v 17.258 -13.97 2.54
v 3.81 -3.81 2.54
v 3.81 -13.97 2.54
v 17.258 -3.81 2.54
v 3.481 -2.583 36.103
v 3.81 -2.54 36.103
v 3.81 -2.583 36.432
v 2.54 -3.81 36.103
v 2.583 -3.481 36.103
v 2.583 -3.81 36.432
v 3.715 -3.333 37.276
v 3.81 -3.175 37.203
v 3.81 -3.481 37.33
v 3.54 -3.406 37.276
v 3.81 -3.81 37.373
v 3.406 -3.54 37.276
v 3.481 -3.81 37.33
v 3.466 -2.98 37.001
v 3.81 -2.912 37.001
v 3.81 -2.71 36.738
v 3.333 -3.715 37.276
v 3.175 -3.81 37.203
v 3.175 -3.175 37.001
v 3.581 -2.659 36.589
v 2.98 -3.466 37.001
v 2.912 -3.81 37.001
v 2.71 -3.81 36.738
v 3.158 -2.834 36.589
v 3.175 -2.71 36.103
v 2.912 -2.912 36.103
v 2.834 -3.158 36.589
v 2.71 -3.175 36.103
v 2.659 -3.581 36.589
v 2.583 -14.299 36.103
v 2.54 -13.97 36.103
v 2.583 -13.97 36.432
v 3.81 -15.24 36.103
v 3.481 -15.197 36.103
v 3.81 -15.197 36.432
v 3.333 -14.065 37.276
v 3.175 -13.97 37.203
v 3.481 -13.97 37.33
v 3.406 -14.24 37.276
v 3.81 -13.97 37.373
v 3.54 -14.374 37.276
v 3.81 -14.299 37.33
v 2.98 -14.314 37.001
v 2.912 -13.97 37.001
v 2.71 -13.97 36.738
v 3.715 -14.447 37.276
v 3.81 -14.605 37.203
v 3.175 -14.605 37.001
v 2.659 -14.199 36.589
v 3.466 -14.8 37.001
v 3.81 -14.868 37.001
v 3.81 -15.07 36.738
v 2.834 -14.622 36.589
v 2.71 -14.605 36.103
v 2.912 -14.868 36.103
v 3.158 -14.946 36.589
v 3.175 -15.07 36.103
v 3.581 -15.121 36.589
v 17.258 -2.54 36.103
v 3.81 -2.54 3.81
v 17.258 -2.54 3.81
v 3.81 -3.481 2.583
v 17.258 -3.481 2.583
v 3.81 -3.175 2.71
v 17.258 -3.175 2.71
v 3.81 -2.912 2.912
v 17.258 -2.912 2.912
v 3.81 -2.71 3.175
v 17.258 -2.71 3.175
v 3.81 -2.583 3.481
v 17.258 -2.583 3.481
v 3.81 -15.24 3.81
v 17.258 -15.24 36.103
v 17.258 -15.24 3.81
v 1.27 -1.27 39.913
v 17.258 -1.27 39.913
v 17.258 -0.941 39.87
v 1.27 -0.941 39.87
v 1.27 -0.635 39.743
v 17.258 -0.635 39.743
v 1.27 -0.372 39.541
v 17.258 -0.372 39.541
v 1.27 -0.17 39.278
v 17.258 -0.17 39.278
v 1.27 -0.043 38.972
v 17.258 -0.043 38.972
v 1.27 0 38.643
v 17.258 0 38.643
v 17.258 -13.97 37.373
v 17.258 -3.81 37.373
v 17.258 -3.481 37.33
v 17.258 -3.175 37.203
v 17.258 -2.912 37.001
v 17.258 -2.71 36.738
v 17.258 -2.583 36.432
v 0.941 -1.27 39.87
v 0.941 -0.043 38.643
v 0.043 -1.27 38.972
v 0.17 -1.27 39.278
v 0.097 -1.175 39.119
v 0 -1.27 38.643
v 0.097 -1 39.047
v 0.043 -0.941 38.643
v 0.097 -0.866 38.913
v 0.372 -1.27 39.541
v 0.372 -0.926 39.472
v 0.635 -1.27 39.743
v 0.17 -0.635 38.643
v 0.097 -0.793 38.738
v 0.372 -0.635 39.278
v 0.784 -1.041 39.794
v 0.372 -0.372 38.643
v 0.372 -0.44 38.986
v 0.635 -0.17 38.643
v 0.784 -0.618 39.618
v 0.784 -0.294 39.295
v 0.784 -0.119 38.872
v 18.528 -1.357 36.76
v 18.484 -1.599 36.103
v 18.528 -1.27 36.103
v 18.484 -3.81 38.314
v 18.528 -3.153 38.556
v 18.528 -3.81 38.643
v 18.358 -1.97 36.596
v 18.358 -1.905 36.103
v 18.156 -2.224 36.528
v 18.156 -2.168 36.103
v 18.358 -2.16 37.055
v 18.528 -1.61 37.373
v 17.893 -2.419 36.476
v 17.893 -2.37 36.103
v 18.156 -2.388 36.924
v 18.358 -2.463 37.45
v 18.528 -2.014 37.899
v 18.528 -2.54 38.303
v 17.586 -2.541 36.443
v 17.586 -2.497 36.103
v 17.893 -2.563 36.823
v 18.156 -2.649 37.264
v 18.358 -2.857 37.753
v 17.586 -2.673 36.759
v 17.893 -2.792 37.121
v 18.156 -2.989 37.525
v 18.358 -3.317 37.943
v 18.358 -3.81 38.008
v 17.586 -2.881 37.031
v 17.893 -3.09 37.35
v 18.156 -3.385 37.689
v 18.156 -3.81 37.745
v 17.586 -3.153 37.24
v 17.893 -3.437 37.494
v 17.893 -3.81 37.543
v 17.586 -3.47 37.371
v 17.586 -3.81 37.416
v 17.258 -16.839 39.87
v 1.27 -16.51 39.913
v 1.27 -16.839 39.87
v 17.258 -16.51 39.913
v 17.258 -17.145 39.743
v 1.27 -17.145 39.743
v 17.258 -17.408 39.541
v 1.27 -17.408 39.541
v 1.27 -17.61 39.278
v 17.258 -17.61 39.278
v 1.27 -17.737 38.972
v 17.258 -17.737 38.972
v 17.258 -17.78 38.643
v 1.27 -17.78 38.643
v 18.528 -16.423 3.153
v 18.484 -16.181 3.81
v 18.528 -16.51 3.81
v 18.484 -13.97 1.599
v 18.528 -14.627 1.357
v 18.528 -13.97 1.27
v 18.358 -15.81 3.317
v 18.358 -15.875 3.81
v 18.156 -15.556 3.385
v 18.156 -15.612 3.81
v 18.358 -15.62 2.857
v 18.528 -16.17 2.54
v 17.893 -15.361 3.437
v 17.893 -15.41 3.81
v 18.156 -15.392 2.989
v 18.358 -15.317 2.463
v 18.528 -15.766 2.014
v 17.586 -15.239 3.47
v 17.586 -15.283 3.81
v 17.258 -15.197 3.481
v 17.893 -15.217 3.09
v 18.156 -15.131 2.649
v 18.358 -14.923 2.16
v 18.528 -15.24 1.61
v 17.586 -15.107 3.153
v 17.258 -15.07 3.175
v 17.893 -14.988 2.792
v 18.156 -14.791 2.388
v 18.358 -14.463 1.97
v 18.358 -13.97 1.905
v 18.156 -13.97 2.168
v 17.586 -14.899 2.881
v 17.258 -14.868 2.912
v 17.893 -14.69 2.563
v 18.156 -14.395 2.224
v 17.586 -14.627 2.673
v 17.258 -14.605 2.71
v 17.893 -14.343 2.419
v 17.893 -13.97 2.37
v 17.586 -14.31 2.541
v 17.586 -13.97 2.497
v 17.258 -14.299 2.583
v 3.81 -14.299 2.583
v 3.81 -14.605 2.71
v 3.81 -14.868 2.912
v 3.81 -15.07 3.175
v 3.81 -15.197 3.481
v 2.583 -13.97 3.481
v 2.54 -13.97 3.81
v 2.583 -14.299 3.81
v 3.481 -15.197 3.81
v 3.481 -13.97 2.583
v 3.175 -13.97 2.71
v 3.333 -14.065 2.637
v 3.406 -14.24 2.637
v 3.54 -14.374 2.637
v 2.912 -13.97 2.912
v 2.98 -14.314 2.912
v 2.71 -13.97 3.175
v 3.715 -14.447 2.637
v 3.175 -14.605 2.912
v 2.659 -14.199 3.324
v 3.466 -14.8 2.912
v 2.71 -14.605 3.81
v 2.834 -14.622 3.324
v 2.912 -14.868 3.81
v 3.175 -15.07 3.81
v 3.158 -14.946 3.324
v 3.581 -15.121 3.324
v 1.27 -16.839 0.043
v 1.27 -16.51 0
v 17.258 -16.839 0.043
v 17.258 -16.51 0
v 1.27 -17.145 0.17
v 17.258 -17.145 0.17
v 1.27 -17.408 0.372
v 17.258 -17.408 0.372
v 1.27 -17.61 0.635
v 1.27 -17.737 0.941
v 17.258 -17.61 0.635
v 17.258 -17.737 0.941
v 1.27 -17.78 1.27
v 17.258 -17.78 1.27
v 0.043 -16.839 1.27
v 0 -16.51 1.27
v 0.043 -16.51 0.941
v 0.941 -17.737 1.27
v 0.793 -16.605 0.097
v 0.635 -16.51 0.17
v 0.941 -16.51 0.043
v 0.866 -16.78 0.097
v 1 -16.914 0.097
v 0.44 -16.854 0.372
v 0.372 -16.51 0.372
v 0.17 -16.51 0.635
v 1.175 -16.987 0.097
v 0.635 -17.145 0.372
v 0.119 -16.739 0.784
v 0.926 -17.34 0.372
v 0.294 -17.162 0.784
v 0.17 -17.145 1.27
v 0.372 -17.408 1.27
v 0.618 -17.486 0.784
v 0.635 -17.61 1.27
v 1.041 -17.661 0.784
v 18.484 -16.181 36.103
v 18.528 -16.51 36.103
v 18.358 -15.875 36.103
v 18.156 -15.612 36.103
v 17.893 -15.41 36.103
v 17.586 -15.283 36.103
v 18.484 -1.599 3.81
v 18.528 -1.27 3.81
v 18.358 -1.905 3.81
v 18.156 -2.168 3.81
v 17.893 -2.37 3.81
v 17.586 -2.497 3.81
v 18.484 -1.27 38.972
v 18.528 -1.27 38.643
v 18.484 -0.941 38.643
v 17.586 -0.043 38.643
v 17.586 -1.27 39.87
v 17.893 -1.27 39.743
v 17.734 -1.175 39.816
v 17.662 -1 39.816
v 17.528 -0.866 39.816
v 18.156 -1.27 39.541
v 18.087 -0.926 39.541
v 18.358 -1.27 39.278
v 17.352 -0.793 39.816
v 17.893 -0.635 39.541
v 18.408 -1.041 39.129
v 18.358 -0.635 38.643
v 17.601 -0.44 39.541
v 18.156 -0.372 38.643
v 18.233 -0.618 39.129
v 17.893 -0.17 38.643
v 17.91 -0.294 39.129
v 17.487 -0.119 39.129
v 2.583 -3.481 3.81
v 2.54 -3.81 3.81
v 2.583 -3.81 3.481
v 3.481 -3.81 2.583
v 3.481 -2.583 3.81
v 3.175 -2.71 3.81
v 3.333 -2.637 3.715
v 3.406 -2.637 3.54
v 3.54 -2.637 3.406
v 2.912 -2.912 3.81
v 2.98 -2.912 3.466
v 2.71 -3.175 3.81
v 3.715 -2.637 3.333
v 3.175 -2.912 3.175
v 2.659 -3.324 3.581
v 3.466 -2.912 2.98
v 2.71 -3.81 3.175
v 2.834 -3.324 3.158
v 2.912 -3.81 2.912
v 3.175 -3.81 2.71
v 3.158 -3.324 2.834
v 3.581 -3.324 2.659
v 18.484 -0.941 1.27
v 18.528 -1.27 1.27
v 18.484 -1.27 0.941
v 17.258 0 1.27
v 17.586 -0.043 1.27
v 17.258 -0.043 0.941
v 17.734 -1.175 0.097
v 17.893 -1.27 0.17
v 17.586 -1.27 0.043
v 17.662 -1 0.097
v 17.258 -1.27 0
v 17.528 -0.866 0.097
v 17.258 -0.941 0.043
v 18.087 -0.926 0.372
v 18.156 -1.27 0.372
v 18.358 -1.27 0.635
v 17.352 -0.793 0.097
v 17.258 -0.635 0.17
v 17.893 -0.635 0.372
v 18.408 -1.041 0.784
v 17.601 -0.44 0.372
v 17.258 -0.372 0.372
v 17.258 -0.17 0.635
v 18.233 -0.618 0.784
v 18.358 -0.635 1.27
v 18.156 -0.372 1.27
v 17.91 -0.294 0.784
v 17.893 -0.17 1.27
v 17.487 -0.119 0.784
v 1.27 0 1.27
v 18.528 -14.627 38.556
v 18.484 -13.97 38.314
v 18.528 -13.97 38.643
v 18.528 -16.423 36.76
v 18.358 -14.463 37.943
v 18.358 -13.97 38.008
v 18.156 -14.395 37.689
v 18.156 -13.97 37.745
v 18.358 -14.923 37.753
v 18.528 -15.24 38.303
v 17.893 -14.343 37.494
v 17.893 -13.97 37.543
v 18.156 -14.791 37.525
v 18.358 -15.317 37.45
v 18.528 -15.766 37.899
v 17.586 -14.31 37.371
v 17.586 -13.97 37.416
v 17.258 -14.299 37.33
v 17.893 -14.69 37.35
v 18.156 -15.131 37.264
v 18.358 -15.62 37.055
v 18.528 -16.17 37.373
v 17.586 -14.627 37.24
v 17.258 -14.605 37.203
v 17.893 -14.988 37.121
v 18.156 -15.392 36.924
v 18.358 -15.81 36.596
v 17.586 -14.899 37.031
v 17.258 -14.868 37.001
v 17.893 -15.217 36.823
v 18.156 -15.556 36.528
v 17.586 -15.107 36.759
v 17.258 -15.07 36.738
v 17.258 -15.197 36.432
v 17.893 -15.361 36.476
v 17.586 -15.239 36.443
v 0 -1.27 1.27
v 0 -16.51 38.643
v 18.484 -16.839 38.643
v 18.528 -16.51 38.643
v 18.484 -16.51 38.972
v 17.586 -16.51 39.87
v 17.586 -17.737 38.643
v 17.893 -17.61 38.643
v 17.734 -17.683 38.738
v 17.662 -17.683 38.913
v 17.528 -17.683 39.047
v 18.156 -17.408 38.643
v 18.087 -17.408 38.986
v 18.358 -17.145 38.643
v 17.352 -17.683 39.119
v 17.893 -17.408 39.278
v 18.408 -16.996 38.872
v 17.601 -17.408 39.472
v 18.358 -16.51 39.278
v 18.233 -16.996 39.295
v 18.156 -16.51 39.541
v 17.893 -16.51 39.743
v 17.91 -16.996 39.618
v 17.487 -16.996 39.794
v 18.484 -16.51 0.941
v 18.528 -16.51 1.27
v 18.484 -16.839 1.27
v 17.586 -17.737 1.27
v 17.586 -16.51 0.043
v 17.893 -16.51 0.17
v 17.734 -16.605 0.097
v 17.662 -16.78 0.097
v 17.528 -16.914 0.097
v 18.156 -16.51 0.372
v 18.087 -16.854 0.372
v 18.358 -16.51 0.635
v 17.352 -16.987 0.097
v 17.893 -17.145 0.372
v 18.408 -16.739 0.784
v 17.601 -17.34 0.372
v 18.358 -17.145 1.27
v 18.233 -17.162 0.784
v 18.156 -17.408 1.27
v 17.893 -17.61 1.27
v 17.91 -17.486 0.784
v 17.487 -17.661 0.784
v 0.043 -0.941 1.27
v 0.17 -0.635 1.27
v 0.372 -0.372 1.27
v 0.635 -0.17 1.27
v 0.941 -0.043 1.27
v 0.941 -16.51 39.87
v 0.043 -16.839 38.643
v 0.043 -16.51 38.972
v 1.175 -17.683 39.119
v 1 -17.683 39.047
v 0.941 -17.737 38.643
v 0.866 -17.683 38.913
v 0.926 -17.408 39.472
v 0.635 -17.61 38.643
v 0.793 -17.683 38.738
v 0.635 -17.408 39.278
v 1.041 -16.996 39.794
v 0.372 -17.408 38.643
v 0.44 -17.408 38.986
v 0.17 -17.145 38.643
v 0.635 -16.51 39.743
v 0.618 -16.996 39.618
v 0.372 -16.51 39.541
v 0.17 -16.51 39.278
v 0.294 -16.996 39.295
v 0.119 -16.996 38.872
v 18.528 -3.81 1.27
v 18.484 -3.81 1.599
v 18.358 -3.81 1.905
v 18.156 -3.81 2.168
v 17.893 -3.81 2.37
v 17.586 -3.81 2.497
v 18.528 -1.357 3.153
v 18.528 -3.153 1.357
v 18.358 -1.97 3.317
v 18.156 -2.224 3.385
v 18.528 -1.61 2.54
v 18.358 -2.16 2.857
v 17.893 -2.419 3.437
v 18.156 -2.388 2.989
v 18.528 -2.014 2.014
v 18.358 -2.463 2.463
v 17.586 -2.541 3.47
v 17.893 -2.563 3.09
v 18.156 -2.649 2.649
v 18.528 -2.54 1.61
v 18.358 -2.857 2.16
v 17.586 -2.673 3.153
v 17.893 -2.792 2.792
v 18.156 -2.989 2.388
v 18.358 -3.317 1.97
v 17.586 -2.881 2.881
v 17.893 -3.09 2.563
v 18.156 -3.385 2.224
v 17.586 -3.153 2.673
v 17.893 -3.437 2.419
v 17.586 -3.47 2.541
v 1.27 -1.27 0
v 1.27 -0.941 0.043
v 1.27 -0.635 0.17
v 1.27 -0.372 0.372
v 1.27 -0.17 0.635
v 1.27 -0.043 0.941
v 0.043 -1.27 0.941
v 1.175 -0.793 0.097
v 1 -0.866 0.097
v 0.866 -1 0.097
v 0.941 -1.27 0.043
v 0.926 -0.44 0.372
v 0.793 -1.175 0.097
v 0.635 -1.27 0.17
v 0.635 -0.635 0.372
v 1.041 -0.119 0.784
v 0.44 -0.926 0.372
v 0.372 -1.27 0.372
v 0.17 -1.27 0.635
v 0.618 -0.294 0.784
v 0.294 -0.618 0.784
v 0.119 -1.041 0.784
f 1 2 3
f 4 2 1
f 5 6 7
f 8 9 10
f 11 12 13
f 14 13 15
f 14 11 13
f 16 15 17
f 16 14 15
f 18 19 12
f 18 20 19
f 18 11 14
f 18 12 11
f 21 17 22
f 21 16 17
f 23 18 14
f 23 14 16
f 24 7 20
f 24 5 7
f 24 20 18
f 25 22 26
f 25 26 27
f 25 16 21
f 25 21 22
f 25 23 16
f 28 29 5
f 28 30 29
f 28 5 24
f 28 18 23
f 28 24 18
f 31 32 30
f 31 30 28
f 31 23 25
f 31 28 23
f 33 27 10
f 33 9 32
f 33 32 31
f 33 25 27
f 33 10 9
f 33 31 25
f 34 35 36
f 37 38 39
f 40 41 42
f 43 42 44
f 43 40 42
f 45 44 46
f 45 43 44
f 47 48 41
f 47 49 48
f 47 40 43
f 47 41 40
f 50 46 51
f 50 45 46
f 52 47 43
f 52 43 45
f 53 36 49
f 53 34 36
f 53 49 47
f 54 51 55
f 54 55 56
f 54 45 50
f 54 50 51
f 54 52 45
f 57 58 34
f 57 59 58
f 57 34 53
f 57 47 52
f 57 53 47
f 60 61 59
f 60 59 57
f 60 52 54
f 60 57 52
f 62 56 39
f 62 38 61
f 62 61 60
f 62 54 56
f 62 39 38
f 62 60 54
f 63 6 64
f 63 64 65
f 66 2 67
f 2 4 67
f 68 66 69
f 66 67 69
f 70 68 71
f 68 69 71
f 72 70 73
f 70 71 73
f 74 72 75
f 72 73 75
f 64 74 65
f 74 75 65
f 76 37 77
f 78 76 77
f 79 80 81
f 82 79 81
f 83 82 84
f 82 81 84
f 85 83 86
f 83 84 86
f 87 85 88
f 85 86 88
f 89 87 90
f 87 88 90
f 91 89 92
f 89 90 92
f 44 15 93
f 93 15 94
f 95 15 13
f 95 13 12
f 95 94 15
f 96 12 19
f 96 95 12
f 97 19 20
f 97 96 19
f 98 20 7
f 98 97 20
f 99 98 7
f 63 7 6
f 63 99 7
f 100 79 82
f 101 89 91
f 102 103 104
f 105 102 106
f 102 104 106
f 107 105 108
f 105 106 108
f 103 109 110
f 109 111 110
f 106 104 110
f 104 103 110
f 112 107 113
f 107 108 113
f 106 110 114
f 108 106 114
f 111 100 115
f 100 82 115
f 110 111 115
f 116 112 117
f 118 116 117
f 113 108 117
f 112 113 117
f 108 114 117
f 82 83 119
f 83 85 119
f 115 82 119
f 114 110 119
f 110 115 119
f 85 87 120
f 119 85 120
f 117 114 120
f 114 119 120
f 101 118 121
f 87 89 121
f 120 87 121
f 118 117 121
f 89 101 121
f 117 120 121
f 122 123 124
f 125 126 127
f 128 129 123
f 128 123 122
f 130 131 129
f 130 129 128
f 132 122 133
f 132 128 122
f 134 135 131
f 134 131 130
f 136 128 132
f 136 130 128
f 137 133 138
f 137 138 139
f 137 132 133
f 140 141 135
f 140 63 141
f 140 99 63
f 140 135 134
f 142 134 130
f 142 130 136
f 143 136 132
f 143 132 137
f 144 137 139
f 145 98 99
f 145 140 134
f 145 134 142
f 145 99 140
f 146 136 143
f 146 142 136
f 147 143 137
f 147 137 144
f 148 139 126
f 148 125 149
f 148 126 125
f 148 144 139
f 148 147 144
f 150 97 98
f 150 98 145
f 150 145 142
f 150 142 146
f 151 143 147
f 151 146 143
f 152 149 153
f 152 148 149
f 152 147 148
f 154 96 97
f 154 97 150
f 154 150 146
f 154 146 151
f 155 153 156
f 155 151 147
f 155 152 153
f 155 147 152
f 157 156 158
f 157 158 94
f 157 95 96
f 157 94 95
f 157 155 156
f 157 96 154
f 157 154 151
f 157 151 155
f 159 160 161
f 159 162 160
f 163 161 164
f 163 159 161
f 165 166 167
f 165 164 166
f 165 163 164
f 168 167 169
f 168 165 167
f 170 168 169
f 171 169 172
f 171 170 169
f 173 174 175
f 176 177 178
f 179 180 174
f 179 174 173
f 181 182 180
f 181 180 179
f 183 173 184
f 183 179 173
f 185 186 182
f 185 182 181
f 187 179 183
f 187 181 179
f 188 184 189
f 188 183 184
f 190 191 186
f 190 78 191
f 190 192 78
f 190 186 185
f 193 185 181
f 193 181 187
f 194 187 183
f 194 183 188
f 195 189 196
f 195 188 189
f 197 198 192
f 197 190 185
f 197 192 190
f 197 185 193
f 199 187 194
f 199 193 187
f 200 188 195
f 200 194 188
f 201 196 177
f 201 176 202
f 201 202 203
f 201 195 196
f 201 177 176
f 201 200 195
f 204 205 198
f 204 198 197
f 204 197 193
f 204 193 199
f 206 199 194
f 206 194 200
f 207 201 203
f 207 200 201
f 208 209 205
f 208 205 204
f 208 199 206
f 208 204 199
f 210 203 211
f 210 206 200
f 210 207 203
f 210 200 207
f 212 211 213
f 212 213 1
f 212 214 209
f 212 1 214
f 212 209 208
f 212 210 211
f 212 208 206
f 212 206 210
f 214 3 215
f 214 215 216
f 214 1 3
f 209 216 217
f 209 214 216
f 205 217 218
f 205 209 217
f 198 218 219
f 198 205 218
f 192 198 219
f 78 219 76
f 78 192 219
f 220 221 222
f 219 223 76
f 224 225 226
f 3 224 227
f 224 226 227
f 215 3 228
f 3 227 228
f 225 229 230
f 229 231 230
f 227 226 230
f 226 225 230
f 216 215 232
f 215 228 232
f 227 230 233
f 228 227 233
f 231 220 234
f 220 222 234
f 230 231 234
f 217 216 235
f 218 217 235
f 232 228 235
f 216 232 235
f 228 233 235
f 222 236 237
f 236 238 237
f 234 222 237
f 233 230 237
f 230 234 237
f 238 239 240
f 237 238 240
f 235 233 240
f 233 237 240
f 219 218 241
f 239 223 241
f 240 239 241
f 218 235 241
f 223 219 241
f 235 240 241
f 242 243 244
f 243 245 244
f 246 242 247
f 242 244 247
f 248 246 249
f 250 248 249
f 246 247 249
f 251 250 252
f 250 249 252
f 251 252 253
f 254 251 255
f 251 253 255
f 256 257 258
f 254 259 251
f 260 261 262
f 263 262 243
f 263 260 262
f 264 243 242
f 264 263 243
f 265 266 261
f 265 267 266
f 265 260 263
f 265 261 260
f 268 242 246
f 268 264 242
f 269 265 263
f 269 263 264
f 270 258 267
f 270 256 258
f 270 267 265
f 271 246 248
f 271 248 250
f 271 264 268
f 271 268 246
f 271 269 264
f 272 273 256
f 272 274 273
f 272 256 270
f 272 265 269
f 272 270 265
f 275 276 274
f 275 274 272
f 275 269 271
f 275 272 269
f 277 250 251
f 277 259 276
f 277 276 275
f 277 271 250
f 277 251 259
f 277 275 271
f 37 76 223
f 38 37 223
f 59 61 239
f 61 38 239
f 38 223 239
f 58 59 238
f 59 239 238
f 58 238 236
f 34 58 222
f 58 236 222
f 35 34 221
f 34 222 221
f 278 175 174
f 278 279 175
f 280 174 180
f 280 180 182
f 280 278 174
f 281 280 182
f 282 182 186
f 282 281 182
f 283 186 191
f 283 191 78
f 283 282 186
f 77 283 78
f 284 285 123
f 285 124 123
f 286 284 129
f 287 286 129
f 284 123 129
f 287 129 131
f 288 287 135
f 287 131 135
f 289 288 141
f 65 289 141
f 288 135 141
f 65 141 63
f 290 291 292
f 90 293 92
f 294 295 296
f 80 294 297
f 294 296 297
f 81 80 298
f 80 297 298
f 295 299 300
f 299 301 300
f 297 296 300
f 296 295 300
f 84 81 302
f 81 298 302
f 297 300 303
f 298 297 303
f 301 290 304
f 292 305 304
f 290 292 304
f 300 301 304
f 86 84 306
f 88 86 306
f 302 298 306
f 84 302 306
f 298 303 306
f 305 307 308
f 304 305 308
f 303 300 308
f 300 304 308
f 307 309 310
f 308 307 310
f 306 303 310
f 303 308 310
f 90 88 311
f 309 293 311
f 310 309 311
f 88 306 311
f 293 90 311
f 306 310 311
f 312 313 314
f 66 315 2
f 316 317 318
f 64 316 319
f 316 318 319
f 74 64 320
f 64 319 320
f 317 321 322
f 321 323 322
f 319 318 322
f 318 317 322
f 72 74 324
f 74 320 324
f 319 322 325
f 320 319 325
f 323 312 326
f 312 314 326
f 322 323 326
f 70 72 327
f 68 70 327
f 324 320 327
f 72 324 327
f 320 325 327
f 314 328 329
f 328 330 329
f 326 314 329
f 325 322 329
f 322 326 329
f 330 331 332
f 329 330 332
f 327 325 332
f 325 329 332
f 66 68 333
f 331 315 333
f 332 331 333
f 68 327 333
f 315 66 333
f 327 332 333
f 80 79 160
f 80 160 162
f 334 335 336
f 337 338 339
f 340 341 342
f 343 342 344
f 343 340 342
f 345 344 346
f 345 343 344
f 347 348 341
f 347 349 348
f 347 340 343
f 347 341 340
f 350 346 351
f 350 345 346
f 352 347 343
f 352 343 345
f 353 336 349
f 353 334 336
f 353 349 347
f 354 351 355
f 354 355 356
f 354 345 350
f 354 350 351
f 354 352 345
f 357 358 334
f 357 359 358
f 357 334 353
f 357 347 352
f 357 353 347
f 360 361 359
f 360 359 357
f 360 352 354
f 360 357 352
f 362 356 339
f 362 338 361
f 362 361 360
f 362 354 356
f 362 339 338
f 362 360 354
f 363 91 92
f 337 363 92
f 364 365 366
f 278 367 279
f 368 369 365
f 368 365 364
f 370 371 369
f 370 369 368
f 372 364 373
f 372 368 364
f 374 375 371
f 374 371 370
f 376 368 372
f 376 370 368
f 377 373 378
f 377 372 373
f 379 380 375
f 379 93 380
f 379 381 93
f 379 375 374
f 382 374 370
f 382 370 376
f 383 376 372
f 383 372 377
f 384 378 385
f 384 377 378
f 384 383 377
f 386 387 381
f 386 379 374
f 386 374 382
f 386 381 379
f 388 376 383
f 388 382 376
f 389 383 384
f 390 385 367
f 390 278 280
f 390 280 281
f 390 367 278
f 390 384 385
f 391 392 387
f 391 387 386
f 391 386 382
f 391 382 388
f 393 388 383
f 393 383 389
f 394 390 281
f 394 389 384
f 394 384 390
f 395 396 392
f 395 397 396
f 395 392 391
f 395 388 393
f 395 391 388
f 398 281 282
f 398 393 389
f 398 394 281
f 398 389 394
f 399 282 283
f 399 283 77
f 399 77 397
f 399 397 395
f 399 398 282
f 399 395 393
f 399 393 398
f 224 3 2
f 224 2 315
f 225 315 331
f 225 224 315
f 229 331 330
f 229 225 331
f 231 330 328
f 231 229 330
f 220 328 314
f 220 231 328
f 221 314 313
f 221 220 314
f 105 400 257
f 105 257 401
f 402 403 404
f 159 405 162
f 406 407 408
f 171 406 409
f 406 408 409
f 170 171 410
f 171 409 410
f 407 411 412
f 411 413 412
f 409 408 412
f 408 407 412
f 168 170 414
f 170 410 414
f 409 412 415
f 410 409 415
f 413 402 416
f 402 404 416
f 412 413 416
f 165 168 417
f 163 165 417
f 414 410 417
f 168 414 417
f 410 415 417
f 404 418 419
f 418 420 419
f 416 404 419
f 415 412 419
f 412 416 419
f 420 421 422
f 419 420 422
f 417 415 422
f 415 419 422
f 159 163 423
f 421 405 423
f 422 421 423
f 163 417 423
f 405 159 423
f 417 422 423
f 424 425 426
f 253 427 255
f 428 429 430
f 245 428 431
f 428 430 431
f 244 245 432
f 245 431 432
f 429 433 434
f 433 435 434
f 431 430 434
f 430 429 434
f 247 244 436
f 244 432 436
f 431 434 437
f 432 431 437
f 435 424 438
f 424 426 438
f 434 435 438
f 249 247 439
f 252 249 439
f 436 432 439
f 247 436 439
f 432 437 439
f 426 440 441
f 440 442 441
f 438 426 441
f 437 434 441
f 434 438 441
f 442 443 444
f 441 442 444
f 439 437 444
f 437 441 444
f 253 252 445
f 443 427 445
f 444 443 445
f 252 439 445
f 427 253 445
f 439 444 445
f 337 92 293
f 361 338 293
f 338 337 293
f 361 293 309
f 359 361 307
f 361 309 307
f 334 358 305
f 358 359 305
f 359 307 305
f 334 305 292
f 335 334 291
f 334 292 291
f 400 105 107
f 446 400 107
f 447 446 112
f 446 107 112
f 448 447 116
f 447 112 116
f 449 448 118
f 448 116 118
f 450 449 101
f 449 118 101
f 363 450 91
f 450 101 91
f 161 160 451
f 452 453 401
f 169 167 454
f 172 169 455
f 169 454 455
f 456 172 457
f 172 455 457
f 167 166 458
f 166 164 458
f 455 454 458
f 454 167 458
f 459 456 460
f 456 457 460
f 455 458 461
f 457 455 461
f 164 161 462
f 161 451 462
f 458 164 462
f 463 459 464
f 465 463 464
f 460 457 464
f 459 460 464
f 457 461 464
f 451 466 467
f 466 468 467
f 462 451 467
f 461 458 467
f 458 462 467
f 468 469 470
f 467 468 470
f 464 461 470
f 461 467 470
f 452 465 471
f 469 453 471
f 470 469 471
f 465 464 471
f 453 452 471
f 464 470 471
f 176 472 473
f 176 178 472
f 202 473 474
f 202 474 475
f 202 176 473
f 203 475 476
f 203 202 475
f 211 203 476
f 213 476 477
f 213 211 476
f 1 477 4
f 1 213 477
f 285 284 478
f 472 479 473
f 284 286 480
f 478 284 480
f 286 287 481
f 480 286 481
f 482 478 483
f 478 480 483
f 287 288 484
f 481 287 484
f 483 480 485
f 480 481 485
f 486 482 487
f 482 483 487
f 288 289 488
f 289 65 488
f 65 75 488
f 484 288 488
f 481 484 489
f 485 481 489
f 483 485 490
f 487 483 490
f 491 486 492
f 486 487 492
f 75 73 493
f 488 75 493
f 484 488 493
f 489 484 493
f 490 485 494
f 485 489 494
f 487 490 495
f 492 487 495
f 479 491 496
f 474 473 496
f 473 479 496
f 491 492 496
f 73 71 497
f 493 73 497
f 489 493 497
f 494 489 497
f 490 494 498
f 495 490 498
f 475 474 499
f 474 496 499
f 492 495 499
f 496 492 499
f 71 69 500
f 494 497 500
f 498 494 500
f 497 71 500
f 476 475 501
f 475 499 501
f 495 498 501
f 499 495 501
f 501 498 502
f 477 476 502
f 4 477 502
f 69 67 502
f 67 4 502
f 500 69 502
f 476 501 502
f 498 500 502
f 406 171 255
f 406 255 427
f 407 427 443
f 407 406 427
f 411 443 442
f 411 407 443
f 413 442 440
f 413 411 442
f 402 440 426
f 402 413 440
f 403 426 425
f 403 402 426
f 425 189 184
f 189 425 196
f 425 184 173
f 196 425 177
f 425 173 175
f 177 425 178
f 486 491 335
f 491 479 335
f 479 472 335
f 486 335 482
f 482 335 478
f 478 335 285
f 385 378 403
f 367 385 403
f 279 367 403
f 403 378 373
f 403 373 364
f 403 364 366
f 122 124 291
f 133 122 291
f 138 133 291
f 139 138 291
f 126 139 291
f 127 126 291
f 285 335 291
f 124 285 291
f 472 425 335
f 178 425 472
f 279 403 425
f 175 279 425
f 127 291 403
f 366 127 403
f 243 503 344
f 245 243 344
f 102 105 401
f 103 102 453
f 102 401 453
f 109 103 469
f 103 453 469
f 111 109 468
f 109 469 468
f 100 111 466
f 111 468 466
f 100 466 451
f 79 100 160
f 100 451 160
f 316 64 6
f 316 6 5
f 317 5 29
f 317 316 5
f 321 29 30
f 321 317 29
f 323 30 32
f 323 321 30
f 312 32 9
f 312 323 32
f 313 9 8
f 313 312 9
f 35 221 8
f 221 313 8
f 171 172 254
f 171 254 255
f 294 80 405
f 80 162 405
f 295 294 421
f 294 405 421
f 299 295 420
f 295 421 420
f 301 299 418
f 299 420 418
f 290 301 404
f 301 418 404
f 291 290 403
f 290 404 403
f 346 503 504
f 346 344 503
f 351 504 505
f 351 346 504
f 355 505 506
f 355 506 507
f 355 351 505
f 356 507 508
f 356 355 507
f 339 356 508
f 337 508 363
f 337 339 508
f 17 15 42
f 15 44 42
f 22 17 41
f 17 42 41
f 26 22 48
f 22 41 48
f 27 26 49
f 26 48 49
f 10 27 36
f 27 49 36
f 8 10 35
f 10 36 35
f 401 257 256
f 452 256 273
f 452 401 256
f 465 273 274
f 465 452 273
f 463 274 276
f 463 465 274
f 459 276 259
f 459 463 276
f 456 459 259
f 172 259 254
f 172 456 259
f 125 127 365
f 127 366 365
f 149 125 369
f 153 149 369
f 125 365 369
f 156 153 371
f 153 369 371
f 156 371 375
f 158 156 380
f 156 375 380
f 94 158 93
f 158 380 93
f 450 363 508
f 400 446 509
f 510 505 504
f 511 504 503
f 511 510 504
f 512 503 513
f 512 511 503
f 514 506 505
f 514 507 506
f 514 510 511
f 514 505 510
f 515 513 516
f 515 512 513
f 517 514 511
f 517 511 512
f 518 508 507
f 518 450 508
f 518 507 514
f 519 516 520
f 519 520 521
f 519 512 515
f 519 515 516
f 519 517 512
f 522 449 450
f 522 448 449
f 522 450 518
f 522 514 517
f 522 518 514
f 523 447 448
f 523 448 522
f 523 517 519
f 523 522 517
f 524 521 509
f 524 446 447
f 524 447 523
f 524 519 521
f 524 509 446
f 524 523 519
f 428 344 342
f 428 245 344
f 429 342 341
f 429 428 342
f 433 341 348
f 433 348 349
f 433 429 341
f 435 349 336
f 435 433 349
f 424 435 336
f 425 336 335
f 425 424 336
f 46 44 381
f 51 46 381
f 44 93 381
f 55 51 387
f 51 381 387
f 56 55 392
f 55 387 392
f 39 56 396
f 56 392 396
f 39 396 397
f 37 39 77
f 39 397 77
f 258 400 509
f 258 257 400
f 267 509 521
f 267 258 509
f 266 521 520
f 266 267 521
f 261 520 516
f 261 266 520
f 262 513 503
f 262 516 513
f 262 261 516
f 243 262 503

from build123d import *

# Parameters (mm, degrees)
F0_W     = 18.5276605189
F0_H     = 39.9128235877
F1_DEPTH = 17.78
F2_T     = -2.54
F3_R     = 1.26999


# Not quite as in the source:
# - a fillet or chamfer is up to 0.001 mm smaller than in the source, because OpenCascade refuses the exact size


with BuildPart() as f1:
    # F0 (on Front) → F1 (new body)
    with BuildSketch(Plane.XZ):
        with Locations((9.2638302594, 19.9564117938)):
            Rectangle(F0_W, F0_H)
    extrude(amount=F1_DEPTH)

    # F2
    f2_openings = [f1.faces().sort_by_distance(p)[0] for p in [
        (18.527661, -8.89, 19.956412),
    ]]
    offset(amount=F2_T, openings=f2_openings)

    # F3 (radius 1.27 in the source; OpenCascade refuses exactly that, so slightly less here)
    f3_edges = [f1.edges().sort_by_distance(p)[0] for p in [
        (18.527661, 0, 19.956412),
        (18.527661, -2.54, 19.956412),
        (18.527661, -8.89, 37.372824),
        (18.527661, -8.89, 39.912824),
        (18.527661, -15.24, 19.956412),
        (18.527661, -17.78, 19.956412),
        (18.527661, -8.89, 2.54),
        (18.527661, -8.89, 0),
        (9.26383, 0, 39.912824),
        (0, -8.89, 39.912824),
        (9.26383, -17.78, 39.912824),
        (2.54, -15.24, 19.956412),
        (2.54, -8.89, 2.54),
        (0, 0, 19.956412),
        (9.26383, 0, 0),
        (0, -17.78, 19.956412),
        (0, -8.89, 0),
        (9.26383, -17.78, 0),
        (2.54, -2.54, 19.956412),
        (10.53383, -2.54, 37.372824),
        (2.54, -8.89, 37.372824),
        (10.53383, -2.54, 2.54),
        (10.53383, -15.24, 2.54),
        (10.53383, -15.24, 37.372824),
    ]]
    fillet(f3_edges, radius=F3_R)


solid = f1.part
